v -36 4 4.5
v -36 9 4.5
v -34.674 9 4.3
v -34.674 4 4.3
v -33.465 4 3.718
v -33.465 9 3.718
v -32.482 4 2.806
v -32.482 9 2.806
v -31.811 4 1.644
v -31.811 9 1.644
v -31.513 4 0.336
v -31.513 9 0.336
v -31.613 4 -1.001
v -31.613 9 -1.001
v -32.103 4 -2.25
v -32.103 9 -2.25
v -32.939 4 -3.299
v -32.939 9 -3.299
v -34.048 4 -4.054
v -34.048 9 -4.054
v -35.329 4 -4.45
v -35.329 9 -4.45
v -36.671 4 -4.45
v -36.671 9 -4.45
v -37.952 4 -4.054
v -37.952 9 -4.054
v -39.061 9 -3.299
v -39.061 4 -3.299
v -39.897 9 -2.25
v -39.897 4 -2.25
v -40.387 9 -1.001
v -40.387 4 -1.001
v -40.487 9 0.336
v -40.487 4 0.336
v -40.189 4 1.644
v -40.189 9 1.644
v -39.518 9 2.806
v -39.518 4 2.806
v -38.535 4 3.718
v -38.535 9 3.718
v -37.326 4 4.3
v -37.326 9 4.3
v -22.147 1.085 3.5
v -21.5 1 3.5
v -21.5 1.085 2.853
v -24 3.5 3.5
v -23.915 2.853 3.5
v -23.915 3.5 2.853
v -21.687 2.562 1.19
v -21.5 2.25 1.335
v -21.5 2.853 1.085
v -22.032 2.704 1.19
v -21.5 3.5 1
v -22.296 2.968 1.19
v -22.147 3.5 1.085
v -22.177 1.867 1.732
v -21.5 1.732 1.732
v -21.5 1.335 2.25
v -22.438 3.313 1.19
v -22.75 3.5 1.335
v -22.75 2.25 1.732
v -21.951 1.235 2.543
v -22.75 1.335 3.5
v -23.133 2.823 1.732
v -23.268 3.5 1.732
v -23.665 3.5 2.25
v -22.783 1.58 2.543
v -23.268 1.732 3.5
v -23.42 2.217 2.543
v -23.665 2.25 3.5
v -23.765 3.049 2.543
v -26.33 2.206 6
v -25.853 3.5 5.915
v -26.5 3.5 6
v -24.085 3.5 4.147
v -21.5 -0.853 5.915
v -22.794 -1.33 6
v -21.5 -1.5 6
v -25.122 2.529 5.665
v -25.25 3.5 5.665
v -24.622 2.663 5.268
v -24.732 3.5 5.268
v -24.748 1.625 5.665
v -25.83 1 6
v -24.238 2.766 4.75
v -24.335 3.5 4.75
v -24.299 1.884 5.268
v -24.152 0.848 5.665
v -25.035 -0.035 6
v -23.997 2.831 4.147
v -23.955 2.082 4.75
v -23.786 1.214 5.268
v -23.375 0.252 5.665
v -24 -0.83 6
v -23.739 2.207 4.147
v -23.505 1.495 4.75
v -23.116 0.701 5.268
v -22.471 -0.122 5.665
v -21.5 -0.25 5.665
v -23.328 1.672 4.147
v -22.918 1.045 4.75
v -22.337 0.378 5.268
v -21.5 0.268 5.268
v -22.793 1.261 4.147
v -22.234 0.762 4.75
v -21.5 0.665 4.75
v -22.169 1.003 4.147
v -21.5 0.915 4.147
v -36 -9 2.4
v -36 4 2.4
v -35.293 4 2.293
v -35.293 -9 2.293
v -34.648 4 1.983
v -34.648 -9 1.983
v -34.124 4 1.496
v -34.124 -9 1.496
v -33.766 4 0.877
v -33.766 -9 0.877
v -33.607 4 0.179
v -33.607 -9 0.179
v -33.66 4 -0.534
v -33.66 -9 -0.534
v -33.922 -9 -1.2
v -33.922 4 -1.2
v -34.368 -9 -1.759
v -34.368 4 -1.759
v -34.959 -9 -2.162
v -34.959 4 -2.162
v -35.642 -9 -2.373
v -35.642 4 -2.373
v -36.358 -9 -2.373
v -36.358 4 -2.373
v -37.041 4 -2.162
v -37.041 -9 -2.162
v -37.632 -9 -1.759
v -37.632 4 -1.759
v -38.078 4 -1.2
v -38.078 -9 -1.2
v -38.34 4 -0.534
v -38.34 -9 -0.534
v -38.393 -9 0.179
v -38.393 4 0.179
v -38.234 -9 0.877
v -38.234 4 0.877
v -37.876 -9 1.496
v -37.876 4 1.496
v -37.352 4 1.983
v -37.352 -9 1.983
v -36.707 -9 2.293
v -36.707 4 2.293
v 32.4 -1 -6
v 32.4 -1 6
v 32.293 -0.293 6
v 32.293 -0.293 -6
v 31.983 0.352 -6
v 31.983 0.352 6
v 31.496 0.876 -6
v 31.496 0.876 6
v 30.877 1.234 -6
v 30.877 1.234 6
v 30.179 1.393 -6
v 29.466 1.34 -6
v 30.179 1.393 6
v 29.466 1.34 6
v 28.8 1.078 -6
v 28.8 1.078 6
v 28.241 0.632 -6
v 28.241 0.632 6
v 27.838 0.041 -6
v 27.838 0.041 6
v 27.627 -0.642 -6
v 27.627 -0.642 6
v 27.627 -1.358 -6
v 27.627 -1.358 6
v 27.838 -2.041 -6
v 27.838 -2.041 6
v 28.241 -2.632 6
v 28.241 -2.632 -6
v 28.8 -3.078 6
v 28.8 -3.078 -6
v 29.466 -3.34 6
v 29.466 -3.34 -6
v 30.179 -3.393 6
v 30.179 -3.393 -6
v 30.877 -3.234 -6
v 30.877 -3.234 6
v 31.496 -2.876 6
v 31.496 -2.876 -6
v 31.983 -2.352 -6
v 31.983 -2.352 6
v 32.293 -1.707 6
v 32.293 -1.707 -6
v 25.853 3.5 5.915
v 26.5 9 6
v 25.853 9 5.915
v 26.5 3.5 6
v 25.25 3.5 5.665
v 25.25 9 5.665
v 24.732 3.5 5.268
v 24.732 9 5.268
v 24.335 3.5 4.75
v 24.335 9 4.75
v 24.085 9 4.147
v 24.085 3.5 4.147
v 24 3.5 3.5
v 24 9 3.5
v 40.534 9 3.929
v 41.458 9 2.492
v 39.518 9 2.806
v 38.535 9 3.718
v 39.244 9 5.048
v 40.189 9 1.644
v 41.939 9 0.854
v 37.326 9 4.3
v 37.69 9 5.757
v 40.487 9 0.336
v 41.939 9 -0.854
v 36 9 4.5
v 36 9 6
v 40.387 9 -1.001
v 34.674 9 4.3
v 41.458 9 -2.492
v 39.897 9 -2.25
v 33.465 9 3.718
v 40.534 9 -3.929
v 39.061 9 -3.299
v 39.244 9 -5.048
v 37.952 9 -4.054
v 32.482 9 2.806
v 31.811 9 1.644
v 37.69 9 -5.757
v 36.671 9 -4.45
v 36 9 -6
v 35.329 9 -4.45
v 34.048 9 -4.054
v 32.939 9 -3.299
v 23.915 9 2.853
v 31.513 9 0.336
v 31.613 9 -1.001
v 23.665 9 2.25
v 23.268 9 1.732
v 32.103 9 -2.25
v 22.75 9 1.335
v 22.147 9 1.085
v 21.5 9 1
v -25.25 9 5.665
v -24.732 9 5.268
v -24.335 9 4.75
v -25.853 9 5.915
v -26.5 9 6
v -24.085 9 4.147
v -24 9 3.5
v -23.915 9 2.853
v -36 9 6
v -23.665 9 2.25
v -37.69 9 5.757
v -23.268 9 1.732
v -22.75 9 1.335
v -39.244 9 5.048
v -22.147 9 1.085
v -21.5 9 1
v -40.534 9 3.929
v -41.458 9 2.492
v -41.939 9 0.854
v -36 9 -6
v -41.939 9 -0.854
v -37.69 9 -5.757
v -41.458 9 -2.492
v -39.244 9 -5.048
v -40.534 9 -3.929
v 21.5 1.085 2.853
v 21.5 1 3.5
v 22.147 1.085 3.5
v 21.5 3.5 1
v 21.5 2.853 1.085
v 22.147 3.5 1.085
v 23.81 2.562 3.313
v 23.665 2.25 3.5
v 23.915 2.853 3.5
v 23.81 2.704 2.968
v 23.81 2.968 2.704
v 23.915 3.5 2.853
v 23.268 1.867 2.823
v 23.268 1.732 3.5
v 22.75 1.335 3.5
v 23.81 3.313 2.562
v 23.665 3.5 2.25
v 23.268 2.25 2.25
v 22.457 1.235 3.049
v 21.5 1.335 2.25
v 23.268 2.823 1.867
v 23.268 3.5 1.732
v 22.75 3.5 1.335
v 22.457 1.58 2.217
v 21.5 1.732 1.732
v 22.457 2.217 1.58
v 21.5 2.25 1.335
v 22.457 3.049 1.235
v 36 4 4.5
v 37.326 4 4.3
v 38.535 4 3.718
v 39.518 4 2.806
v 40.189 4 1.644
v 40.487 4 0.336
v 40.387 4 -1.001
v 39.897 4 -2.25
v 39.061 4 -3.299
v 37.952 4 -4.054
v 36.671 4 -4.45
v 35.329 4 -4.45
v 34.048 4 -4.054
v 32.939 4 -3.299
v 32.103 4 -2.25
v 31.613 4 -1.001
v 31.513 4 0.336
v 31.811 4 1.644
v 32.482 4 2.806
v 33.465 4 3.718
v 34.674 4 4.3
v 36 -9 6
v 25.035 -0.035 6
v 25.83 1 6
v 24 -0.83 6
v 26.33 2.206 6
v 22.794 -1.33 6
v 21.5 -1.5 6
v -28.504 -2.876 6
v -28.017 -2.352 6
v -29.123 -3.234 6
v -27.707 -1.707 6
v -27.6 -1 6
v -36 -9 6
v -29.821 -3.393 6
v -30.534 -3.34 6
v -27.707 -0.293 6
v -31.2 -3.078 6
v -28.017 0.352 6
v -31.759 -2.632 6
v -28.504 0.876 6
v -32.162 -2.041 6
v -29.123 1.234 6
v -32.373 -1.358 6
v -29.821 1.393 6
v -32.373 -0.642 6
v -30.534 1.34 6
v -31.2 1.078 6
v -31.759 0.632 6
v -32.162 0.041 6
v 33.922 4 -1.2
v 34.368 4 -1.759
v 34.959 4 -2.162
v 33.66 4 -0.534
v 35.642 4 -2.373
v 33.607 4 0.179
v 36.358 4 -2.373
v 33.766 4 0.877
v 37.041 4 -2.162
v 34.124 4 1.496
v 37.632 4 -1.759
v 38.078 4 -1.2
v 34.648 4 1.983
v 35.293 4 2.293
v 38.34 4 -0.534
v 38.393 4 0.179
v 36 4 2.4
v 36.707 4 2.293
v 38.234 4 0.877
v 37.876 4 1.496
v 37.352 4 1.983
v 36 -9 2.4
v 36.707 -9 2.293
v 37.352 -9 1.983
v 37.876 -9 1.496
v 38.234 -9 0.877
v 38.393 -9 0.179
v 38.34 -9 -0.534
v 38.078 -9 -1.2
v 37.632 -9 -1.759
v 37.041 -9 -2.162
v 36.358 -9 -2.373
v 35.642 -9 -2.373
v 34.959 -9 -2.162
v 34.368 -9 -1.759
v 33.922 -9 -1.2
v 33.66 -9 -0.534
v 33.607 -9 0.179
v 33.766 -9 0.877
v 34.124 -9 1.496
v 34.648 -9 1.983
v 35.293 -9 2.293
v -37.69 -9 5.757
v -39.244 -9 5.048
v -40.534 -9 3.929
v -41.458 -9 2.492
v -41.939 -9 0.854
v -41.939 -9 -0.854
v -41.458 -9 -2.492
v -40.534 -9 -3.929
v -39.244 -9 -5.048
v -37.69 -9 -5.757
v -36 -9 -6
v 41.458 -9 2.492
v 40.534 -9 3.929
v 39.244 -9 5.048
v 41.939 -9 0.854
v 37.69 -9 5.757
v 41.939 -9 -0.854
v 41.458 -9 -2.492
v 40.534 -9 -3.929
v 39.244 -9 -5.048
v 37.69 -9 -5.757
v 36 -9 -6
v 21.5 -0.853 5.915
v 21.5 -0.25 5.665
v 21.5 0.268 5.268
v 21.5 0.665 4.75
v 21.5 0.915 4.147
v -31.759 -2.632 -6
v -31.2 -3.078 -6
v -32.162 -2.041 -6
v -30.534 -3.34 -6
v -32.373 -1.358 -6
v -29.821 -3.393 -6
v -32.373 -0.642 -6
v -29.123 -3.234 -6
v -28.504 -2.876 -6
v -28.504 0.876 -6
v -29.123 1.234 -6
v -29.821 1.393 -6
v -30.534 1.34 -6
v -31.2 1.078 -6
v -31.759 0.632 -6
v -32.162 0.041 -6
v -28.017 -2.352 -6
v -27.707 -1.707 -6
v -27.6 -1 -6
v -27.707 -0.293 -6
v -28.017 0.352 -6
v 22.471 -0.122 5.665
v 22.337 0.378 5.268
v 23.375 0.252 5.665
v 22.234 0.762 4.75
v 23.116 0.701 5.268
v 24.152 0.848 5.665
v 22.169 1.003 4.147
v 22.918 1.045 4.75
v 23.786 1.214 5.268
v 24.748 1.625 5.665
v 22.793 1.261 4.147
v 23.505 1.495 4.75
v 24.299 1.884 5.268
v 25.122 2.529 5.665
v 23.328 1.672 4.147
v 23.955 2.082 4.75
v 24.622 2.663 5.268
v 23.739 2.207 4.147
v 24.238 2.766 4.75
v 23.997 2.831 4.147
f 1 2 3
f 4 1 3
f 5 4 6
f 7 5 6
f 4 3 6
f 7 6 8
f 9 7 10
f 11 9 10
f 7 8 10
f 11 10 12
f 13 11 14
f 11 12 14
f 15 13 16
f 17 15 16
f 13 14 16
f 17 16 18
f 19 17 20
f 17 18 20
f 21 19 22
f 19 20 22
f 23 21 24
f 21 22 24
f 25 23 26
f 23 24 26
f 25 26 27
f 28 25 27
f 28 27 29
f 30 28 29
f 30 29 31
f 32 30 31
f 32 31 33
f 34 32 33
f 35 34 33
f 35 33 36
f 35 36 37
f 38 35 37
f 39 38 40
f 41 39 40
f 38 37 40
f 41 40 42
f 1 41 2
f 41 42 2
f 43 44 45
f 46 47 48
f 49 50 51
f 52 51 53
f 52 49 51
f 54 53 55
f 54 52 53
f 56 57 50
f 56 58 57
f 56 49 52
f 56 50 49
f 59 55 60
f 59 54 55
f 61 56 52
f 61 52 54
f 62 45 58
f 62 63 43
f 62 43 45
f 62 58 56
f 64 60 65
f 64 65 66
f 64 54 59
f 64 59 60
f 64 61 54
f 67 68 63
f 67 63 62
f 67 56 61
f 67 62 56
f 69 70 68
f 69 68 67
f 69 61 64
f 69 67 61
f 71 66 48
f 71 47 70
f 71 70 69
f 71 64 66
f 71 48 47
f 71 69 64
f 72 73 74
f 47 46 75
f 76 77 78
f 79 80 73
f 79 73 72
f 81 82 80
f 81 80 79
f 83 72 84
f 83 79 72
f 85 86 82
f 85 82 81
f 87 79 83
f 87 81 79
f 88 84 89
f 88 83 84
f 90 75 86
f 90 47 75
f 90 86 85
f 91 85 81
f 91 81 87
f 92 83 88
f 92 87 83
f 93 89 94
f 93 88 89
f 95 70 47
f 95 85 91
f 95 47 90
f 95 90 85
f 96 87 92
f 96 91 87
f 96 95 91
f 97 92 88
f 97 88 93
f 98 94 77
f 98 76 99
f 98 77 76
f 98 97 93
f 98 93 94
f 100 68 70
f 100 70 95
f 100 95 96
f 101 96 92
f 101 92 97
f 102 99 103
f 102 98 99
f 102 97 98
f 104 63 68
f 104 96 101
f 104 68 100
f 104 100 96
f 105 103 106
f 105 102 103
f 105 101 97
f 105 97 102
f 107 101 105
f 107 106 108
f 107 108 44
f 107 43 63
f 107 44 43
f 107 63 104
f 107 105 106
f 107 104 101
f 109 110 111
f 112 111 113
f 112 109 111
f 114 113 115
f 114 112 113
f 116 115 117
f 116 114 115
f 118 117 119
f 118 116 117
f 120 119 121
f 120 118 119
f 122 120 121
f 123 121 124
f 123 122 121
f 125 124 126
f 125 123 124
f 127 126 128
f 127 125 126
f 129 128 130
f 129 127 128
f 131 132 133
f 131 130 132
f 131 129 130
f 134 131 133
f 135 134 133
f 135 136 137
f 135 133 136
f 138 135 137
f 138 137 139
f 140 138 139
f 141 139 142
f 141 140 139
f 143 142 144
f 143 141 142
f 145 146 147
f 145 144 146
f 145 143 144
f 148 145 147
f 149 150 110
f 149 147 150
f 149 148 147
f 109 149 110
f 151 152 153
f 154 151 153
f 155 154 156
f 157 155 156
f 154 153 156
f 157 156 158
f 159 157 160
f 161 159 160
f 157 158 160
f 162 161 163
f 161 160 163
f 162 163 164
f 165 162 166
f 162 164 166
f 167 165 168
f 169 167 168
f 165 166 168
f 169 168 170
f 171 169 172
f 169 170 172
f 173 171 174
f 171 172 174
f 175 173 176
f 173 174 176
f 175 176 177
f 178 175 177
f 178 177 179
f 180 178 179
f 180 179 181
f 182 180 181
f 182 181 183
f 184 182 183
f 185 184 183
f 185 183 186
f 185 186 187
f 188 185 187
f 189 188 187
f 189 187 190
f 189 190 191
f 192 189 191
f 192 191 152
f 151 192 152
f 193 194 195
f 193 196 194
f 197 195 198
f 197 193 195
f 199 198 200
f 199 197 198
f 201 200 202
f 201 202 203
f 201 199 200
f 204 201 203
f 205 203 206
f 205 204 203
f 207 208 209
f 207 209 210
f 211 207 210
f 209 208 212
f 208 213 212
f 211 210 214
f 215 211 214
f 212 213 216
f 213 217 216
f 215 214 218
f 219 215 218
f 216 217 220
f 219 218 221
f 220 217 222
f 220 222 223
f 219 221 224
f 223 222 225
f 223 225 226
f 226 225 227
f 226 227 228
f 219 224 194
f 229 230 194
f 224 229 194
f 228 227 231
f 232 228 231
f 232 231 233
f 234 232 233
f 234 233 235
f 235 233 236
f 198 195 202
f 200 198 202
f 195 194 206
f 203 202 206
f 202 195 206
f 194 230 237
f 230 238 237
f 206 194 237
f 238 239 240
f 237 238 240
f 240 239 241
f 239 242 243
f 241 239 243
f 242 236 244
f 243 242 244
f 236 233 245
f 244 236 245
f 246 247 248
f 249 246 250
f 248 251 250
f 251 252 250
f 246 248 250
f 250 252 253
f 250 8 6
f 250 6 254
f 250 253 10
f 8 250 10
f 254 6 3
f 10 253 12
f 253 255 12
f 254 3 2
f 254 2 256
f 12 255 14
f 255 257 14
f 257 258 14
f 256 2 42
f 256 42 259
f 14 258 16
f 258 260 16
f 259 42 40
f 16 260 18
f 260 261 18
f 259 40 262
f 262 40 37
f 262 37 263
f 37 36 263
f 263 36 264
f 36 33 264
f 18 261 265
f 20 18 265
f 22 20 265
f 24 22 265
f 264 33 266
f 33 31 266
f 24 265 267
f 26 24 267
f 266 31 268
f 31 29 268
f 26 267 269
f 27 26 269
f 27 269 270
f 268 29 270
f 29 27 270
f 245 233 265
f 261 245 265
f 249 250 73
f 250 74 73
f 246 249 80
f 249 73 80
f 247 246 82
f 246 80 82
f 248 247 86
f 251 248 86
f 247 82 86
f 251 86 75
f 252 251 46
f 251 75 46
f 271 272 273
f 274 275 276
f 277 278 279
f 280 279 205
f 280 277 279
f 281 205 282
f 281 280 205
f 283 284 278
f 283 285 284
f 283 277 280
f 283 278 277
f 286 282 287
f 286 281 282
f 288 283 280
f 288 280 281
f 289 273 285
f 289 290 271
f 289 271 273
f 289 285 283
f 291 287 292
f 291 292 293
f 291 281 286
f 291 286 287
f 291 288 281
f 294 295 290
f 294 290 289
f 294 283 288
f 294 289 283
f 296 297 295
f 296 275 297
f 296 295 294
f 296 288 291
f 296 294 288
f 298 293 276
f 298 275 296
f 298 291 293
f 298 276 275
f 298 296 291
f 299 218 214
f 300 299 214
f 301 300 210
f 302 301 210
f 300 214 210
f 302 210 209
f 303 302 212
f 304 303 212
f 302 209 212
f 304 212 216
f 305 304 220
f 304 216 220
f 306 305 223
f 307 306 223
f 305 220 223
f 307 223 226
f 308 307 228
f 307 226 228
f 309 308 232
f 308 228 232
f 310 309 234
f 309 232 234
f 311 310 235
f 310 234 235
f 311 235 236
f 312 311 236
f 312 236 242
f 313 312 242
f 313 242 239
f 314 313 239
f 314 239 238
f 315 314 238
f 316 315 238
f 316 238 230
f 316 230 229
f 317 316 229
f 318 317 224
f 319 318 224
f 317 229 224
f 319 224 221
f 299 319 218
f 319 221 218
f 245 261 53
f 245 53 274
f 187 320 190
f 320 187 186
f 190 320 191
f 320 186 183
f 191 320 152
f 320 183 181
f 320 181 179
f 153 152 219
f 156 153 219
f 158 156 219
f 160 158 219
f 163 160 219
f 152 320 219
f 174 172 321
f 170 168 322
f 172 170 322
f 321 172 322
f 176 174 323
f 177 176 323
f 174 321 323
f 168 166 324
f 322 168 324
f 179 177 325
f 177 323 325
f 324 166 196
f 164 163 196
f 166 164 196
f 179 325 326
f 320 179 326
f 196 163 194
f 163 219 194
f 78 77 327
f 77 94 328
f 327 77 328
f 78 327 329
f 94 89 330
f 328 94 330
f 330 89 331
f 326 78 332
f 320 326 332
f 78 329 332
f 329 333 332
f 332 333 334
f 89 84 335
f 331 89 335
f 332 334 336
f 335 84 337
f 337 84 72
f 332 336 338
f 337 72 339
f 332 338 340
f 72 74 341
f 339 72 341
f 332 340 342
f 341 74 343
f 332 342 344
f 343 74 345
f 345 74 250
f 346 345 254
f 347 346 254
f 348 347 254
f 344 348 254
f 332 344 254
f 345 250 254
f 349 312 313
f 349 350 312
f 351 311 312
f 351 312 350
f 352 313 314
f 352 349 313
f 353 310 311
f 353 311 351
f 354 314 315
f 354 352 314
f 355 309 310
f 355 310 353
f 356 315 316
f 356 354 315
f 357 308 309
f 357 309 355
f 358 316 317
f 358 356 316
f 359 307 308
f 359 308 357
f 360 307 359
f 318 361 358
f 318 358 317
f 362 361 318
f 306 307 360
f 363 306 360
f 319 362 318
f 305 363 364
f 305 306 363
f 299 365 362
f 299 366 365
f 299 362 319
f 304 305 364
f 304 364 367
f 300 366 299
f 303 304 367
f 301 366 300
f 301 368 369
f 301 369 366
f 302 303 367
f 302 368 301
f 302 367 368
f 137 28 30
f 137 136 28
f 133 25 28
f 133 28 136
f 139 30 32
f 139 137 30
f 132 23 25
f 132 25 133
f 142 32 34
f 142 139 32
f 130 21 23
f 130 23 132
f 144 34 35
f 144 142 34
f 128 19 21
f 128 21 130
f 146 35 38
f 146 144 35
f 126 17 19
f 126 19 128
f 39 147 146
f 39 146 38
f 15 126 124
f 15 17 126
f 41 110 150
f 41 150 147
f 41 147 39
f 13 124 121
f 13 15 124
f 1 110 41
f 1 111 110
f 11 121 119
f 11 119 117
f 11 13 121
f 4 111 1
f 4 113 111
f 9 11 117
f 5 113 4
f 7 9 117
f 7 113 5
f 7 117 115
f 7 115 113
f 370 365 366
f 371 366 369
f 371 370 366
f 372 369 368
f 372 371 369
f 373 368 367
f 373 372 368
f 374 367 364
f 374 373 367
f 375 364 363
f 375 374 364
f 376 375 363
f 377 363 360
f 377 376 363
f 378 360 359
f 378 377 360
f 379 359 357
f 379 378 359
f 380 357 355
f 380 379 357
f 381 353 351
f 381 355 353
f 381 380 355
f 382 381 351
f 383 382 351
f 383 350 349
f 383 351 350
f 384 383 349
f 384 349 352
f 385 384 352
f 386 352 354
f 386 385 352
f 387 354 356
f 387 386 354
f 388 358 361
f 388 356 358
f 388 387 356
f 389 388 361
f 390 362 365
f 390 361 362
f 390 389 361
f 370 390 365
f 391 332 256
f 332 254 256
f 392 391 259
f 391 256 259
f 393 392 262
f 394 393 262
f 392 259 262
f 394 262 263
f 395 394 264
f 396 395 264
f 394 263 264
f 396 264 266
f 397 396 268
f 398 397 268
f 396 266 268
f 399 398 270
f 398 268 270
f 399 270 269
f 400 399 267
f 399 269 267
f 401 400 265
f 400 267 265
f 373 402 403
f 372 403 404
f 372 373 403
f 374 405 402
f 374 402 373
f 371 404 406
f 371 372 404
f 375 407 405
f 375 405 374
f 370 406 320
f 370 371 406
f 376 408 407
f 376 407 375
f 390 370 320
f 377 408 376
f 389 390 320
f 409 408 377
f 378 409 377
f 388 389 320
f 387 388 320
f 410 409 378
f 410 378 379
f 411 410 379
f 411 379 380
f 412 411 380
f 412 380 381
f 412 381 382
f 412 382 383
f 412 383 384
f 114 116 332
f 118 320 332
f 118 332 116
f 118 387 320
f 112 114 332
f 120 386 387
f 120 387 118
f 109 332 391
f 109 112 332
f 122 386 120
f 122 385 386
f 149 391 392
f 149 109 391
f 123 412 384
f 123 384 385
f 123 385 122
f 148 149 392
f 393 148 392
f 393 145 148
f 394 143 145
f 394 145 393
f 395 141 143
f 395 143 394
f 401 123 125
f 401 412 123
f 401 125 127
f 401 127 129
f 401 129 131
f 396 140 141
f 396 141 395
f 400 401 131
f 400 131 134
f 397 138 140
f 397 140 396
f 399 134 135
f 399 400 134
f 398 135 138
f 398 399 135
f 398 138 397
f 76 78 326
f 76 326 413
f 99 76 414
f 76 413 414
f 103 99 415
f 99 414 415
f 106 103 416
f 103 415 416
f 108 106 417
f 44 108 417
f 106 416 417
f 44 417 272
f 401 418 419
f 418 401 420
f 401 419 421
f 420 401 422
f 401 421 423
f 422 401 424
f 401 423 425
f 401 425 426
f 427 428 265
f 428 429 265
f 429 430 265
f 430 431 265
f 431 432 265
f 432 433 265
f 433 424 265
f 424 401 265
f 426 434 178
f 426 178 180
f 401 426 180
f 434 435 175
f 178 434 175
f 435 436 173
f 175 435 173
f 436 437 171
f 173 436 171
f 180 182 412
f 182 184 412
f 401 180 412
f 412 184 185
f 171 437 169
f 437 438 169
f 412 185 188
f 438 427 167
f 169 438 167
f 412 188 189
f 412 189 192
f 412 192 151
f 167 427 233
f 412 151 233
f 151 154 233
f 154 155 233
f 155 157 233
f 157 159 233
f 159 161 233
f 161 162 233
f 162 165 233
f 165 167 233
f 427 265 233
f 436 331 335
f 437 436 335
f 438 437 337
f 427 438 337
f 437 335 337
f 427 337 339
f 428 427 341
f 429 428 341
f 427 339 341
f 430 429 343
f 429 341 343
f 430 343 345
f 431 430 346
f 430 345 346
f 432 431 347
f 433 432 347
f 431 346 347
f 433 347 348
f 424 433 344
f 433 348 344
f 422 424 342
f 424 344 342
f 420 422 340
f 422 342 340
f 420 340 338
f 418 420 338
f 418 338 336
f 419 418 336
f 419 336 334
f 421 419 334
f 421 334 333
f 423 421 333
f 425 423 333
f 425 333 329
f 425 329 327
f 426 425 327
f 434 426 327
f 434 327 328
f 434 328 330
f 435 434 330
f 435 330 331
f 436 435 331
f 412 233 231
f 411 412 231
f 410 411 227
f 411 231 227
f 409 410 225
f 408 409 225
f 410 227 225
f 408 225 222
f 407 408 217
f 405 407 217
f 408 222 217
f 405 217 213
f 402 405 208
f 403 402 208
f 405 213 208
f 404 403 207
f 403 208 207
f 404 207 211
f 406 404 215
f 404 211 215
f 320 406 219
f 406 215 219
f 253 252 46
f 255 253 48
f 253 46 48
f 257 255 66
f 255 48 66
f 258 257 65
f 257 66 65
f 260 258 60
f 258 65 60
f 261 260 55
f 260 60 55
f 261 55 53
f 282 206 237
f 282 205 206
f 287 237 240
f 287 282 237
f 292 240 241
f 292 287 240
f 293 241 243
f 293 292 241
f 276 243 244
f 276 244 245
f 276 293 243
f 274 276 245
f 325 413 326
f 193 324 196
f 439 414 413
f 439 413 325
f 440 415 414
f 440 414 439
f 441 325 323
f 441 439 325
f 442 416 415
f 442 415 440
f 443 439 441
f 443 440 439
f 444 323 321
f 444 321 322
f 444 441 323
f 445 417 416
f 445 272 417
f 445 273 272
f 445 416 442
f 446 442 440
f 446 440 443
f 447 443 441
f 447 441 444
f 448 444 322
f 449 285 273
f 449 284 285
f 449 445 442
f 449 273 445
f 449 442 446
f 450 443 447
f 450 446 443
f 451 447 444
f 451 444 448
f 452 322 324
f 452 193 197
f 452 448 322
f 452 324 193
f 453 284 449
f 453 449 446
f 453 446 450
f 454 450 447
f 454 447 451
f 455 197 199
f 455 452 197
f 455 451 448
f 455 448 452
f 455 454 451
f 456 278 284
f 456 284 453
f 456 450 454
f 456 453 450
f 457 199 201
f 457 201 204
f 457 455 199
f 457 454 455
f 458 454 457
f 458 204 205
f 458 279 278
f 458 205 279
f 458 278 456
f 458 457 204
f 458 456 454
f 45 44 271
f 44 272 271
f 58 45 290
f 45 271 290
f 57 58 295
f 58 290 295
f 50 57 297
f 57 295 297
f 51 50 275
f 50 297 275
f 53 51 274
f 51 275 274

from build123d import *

# Parameters (mm, degrees)
SKETCH1_R           = 2.4
BOSS_EXTRUDE1_DEPTH = 9
SKETCH2_R           = 4.5
CUT_EXTRUDE1_DEPTH  = 5
SKETCH3_W           = 48
SKETCH3_H           = 5
CUT_EXTRUDE2_DEPTH  = 8
FILLET1_R           = 2.5
SKETCH4_R           = 2.4
CUT_EXTRUDE3_DEPTH  = 45.598206242


with BuildPart() as part:
    # Sketch1 → Boss-Extrude1 (new, symmetric)
    with BuildSketch(Plane(origin=(0, 0, 0), x_dir=(1, 0, 0), z_dir=(0, 1, 0))):
        with BuildLine():
            Line((36, -6), (-36, -6))
            ThreePointArc((-36, -6), (-42, 0), (-36, 6))
            Line((-36, 6), (36, 6))
            ThreePointArc((36, 6), (42, 0), (36, -6))
        make_face()
        with Locations(Location((-36, 0, 0), (0, 0, 270))):
            Circle(SKETCH1_R, mode=Mode.SUBTRACT)
        with Locations(Location((36, 0, 0), (0, 0, 270))):
            Circle(SKETCH1_R, mode=Mode.SUBTRACT)
    extrude(amount=BOSS_EXTRUDE1_DEPTH, both=True)

    # Sketch2 → Cut-Extrude1 (cut)
    with BuildSketch(Plane(origin=(0, 9, 0), x_dir=(1, 0, 0), z_dir=(0, 1, 0))):
        with Locations(Location((-36, 0, 0), (0, 0, 270))):
            Circle(SKETCH2_R)
        with Locations(Location((36, 0, 0), (0, 0, 270))):
            Circle(SKETCH2_R)
    extrude(amount=-CUT_EXTRUDE1_DEPTH, mode=Mode.SUBTRACT)

    # Sketch3 → Cut-Extrude2 (cut)
    with BuildSketch(Plane(origin=(0, 9, 0), x_dir=(1, 0, 0), z_dir=(0, 1, 0))):
        with Locations((0, -3.5)):
            Rectangle(SKETCH3_W, SKETCH3_H)
    extrude(amount=-CUT_EXTRUDE2_DEPTH, mode=Mode.SUBTRACT)

    # Fillet1
    fillet1_edges = [part.edges().sort_by_distance(p)[0] for p in [
        (-24, 1, 3.5),
        (-24, 5, 6),
        (0, 1, 1),
        (-24, 5, 1),
        (24, 1, 3.5),
        (24, 5, 1),
        (0, 1, 6),
        (24, 5, 6),
    ]]
    fillet(fillet1_edges, radius=FILLET1_R - 0.0001)  # a hair under: the kernel refuses the full size

    # Sketch4 → Cut-Extrude3 (cut, through all)
    with BuildSketch(Plane.XY.offset(6)):
        with Locations((-30, -1)):
            Circle(SKETCH4_R)
        with Locations((30, -1)):
            Circle(SKETCH4_R)
    extrude(amount=-CUT_EXTRUDE3_DEPTH, mode=Mode.SUBTRACT)


solid = part.part
